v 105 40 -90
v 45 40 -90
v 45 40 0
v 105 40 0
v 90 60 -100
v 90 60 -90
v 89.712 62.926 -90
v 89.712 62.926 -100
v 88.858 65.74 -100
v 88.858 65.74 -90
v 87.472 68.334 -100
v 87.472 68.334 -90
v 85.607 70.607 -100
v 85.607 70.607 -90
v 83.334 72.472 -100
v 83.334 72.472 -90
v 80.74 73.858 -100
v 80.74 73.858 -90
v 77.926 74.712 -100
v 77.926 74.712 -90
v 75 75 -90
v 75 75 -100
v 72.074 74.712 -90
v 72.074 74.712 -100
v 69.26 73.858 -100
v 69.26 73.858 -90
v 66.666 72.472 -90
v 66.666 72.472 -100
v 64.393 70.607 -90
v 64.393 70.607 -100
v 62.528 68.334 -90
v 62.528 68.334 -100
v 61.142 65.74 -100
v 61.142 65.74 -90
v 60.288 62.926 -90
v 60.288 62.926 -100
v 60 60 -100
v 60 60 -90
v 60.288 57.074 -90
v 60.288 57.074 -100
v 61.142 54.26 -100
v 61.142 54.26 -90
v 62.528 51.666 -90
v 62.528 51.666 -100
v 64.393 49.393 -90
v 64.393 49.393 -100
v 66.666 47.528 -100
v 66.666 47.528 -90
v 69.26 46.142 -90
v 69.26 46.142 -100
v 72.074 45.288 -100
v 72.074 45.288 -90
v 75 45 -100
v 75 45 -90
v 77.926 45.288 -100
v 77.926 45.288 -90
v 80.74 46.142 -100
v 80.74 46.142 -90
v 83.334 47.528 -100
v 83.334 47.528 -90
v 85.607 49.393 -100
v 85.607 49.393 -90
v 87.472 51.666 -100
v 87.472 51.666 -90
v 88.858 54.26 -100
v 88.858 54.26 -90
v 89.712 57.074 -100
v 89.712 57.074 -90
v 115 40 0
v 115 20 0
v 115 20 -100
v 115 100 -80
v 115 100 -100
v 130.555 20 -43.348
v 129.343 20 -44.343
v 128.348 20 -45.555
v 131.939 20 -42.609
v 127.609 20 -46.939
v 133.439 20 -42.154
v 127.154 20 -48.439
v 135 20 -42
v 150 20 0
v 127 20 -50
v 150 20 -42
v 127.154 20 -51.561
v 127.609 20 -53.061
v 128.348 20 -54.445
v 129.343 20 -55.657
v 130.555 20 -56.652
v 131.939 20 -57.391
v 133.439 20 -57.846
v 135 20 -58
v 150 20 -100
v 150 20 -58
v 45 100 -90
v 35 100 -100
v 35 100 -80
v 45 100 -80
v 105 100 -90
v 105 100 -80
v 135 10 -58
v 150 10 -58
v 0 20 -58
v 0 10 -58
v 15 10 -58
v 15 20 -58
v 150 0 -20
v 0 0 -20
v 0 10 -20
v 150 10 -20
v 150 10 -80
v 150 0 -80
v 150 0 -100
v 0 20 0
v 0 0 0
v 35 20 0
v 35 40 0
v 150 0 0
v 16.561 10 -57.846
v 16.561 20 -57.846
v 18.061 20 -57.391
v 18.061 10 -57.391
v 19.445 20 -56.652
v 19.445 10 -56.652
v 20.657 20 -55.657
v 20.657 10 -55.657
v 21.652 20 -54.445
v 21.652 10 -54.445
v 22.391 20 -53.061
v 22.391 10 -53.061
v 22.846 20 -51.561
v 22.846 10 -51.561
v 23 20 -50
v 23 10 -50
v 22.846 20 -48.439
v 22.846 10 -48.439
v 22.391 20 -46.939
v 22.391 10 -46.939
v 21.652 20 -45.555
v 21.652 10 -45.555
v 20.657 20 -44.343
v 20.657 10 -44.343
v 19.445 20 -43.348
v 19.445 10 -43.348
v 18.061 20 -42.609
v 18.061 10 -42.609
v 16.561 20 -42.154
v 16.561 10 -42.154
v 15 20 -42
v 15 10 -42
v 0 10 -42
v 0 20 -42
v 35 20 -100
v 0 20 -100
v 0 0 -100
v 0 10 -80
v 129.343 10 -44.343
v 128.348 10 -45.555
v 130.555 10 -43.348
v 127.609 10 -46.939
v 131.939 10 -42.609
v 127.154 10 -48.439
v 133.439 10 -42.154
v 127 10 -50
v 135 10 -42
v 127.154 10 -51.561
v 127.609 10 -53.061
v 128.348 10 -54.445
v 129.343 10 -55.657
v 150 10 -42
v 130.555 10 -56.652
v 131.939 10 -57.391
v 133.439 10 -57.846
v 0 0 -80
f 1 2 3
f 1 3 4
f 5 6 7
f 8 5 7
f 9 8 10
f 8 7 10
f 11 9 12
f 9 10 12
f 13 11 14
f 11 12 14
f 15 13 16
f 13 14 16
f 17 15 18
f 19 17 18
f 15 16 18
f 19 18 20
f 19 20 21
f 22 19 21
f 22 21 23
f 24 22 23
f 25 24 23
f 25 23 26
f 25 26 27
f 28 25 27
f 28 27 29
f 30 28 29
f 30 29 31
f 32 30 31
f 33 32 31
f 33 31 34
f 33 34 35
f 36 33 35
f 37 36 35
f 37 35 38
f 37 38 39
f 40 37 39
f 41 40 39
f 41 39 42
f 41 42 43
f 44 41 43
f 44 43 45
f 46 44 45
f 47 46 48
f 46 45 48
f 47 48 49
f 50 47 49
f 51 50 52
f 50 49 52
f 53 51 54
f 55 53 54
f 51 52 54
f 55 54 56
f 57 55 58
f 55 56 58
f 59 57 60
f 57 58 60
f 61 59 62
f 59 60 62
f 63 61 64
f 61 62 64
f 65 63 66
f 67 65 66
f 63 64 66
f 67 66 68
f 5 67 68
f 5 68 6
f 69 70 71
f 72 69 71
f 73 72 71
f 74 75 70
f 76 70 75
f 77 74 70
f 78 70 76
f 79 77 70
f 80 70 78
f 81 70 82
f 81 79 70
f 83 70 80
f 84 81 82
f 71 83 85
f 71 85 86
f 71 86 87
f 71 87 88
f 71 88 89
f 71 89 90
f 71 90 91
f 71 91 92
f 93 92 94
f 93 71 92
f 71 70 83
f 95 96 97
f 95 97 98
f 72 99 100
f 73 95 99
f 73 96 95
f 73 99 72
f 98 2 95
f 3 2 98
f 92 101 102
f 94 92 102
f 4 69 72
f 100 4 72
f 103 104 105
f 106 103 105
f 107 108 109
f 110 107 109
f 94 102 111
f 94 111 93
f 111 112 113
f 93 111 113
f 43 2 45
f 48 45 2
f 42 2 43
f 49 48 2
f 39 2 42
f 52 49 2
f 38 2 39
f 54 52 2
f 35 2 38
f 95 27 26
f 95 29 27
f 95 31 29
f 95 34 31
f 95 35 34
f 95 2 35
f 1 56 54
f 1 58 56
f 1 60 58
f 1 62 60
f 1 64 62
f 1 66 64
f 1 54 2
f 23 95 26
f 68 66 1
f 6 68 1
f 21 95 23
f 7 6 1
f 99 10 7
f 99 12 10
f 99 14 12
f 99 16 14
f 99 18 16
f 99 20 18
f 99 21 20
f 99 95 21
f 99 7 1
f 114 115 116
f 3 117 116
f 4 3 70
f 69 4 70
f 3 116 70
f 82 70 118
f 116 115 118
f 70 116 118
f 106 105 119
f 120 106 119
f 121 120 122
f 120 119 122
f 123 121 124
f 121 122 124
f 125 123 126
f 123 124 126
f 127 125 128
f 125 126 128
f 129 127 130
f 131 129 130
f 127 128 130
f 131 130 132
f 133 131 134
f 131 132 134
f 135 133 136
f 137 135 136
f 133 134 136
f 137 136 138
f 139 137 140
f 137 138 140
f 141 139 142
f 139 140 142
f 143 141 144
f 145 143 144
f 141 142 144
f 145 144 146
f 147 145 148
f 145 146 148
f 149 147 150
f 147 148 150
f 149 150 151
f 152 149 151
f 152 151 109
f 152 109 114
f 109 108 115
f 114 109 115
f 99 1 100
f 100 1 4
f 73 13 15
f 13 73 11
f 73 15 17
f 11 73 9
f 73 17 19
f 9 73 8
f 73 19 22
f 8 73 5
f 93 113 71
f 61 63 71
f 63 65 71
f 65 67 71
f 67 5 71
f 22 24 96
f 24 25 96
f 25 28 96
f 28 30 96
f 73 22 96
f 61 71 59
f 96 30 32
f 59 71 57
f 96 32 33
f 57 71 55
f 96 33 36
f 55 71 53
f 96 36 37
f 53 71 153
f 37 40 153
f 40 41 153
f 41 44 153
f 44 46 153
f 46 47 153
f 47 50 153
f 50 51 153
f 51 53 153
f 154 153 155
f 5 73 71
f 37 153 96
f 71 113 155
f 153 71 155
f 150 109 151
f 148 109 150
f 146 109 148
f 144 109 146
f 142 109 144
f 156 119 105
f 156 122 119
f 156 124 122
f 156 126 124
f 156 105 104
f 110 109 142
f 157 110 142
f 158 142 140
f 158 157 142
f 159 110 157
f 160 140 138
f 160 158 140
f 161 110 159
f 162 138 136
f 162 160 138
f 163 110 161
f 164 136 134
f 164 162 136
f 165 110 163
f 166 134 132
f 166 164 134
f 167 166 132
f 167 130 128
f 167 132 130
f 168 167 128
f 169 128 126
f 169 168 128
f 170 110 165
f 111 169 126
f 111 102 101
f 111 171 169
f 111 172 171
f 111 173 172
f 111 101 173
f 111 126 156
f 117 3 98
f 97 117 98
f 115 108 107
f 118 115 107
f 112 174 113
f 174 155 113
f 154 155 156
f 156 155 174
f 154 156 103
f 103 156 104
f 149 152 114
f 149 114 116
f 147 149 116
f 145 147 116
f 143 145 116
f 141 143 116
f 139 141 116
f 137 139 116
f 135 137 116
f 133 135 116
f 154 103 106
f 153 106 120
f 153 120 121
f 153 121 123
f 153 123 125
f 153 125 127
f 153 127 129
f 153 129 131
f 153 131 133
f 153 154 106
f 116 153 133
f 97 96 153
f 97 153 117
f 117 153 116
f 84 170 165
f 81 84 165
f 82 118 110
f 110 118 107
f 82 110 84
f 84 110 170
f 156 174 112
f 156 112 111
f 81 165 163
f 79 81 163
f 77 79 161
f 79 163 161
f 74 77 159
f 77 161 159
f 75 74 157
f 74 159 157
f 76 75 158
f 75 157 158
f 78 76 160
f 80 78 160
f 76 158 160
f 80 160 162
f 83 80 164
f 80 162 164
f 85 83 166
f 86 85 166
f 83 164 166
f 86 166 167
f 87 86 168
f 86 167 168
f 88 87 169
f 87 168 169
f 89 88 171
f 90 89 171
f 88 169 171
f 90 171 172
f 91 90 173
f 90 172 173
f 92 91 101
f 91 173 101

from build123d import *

# Parameters (mm, degrees)
BOSS_EXTRUDE1_DEPTH = 20
SKETCH2_W           = 60
SKETCH2_H           = 10
CUT_EXTRUDE1_DEPTH  = 182.383571472
SKETCH3_W           = 80
SKETCH3_H           = 100
BOSS_EXTRUDE2_DEPTH = 20
BOSS_EXTRUDE4_DEPTH = 60
CUT_EXTRUDE5_DEPTH  = 189.745860882
SKETCH12_R          = 15
CUT_EXTRUDE6_DEPTH  = 198.230829233
SKETCH13_W          = 60
SKETCH13_H          = 60
CUT_EXTRUDE7_DEPTH  = 10


with BuildPart() as part:
    # Sketch1 → Boss-Extrude1 (new body)
    with BuildSketch(Plane(origin=(0, 0, 0), x_dir=(1, 0, 0), z_dir=(0, 1, 0))):
        with BuildLine():
            Line((135, 58), (150, 58))
            Line((150, 58), (150, 100))
            Line((150, 100), (0, 100))
            Line((0, 100), (0, 58))
            Line((0, 58), (15, 58))
            ThreePointArc((15, 58), (23, 50), (15, 42))
            Line((15, 42), (0, 42))
            Line((0, 42), (0, 0))
            Line((0, 0), (150, 0))
            Line((150, 0), (150, 42))
            Line((150, 42), (135, 42))
            ThreePointArc((135, 42), (127, 50), (135, 58))
        make_face()
    extrude(amount=BOSS_EXTRUDE1_DEPTH)

    # Sketch2 → Cut-Extrude1 (cut, through all)
    with BuildSketch(Plane(origin=(150, 0, 0), x_dir=(0, 0, -1), z_dir=(1, 0, 0))):
        with Locations((50, 5)):
            Rectangle(SKETCH2_W, SKETCH2_H)
    extrude(amount=-CUT_EXTRUDE1_DEPTH, mode=Mode.SUBTRACT)

    # Sketch3 → Boss-Extrude2 (add)
    with BuildSketch(Plane(origin=(0, 20, 0), x_dir=(1, 0, 0), z_dir=(0, 1, 0))):
        with Locations((75, 50)):
            Rectangle(SKETCH3_W, SKETCH3_H)
    extrude(amount=BOSS_EXTRUDE2_DEPTH)

    # Sketch8 → Boss-Extrude4 (add)
    with BuildSketch(Plane(origin=(0, 40, 0), x_dir=(1, 0, 0), z_dir=(0, 1, 0))):
        Polygon((115, 100), (35, 100), (35, 0), (45, 0), (45, 80), (105, 80), (105, 0), (115, 0), align=None)
    extrude(amount=BOSS_EXTRUDE4_DEPTH)

    # Sketch11 → Cut-Extrude5 (cut, through all)
    with BuildSketch(Plane(origin=(125, 0, 0), x_dir=(0, 0, -1), z_dir=(1, 0, 0))):
        Polygon((0, 40), (80, 100), (0, 100), align=None)
    extrude(amount=-CUT_EXTRUDE5_DEPTH, mode=Mode.SUBTRACT)

    # Sketch12 → Cut-Extrude6 (cut, through all)
    with BuildSketch(Plane.XY.offset(-80)):
        with Locations((75, 60)):
            Circle(SKETCH12_R)
    extrude(amount=-CUT_EXTRUDE6_DEPTH, mode=Mode.SUBTRACT)

    # Sketch13 → Cut-Extrude7 (cut)
    with BuildSketch(Plane.XY.offset(-80)):
        with Locations((75, 70)):
            Rectangle(SKETCH13_W, SKETCH13_H)
    extrude(amount=-CUT_EXTRUDE7_DEPTH, mode=Mode.SUBTRACT)


solid = part.part
